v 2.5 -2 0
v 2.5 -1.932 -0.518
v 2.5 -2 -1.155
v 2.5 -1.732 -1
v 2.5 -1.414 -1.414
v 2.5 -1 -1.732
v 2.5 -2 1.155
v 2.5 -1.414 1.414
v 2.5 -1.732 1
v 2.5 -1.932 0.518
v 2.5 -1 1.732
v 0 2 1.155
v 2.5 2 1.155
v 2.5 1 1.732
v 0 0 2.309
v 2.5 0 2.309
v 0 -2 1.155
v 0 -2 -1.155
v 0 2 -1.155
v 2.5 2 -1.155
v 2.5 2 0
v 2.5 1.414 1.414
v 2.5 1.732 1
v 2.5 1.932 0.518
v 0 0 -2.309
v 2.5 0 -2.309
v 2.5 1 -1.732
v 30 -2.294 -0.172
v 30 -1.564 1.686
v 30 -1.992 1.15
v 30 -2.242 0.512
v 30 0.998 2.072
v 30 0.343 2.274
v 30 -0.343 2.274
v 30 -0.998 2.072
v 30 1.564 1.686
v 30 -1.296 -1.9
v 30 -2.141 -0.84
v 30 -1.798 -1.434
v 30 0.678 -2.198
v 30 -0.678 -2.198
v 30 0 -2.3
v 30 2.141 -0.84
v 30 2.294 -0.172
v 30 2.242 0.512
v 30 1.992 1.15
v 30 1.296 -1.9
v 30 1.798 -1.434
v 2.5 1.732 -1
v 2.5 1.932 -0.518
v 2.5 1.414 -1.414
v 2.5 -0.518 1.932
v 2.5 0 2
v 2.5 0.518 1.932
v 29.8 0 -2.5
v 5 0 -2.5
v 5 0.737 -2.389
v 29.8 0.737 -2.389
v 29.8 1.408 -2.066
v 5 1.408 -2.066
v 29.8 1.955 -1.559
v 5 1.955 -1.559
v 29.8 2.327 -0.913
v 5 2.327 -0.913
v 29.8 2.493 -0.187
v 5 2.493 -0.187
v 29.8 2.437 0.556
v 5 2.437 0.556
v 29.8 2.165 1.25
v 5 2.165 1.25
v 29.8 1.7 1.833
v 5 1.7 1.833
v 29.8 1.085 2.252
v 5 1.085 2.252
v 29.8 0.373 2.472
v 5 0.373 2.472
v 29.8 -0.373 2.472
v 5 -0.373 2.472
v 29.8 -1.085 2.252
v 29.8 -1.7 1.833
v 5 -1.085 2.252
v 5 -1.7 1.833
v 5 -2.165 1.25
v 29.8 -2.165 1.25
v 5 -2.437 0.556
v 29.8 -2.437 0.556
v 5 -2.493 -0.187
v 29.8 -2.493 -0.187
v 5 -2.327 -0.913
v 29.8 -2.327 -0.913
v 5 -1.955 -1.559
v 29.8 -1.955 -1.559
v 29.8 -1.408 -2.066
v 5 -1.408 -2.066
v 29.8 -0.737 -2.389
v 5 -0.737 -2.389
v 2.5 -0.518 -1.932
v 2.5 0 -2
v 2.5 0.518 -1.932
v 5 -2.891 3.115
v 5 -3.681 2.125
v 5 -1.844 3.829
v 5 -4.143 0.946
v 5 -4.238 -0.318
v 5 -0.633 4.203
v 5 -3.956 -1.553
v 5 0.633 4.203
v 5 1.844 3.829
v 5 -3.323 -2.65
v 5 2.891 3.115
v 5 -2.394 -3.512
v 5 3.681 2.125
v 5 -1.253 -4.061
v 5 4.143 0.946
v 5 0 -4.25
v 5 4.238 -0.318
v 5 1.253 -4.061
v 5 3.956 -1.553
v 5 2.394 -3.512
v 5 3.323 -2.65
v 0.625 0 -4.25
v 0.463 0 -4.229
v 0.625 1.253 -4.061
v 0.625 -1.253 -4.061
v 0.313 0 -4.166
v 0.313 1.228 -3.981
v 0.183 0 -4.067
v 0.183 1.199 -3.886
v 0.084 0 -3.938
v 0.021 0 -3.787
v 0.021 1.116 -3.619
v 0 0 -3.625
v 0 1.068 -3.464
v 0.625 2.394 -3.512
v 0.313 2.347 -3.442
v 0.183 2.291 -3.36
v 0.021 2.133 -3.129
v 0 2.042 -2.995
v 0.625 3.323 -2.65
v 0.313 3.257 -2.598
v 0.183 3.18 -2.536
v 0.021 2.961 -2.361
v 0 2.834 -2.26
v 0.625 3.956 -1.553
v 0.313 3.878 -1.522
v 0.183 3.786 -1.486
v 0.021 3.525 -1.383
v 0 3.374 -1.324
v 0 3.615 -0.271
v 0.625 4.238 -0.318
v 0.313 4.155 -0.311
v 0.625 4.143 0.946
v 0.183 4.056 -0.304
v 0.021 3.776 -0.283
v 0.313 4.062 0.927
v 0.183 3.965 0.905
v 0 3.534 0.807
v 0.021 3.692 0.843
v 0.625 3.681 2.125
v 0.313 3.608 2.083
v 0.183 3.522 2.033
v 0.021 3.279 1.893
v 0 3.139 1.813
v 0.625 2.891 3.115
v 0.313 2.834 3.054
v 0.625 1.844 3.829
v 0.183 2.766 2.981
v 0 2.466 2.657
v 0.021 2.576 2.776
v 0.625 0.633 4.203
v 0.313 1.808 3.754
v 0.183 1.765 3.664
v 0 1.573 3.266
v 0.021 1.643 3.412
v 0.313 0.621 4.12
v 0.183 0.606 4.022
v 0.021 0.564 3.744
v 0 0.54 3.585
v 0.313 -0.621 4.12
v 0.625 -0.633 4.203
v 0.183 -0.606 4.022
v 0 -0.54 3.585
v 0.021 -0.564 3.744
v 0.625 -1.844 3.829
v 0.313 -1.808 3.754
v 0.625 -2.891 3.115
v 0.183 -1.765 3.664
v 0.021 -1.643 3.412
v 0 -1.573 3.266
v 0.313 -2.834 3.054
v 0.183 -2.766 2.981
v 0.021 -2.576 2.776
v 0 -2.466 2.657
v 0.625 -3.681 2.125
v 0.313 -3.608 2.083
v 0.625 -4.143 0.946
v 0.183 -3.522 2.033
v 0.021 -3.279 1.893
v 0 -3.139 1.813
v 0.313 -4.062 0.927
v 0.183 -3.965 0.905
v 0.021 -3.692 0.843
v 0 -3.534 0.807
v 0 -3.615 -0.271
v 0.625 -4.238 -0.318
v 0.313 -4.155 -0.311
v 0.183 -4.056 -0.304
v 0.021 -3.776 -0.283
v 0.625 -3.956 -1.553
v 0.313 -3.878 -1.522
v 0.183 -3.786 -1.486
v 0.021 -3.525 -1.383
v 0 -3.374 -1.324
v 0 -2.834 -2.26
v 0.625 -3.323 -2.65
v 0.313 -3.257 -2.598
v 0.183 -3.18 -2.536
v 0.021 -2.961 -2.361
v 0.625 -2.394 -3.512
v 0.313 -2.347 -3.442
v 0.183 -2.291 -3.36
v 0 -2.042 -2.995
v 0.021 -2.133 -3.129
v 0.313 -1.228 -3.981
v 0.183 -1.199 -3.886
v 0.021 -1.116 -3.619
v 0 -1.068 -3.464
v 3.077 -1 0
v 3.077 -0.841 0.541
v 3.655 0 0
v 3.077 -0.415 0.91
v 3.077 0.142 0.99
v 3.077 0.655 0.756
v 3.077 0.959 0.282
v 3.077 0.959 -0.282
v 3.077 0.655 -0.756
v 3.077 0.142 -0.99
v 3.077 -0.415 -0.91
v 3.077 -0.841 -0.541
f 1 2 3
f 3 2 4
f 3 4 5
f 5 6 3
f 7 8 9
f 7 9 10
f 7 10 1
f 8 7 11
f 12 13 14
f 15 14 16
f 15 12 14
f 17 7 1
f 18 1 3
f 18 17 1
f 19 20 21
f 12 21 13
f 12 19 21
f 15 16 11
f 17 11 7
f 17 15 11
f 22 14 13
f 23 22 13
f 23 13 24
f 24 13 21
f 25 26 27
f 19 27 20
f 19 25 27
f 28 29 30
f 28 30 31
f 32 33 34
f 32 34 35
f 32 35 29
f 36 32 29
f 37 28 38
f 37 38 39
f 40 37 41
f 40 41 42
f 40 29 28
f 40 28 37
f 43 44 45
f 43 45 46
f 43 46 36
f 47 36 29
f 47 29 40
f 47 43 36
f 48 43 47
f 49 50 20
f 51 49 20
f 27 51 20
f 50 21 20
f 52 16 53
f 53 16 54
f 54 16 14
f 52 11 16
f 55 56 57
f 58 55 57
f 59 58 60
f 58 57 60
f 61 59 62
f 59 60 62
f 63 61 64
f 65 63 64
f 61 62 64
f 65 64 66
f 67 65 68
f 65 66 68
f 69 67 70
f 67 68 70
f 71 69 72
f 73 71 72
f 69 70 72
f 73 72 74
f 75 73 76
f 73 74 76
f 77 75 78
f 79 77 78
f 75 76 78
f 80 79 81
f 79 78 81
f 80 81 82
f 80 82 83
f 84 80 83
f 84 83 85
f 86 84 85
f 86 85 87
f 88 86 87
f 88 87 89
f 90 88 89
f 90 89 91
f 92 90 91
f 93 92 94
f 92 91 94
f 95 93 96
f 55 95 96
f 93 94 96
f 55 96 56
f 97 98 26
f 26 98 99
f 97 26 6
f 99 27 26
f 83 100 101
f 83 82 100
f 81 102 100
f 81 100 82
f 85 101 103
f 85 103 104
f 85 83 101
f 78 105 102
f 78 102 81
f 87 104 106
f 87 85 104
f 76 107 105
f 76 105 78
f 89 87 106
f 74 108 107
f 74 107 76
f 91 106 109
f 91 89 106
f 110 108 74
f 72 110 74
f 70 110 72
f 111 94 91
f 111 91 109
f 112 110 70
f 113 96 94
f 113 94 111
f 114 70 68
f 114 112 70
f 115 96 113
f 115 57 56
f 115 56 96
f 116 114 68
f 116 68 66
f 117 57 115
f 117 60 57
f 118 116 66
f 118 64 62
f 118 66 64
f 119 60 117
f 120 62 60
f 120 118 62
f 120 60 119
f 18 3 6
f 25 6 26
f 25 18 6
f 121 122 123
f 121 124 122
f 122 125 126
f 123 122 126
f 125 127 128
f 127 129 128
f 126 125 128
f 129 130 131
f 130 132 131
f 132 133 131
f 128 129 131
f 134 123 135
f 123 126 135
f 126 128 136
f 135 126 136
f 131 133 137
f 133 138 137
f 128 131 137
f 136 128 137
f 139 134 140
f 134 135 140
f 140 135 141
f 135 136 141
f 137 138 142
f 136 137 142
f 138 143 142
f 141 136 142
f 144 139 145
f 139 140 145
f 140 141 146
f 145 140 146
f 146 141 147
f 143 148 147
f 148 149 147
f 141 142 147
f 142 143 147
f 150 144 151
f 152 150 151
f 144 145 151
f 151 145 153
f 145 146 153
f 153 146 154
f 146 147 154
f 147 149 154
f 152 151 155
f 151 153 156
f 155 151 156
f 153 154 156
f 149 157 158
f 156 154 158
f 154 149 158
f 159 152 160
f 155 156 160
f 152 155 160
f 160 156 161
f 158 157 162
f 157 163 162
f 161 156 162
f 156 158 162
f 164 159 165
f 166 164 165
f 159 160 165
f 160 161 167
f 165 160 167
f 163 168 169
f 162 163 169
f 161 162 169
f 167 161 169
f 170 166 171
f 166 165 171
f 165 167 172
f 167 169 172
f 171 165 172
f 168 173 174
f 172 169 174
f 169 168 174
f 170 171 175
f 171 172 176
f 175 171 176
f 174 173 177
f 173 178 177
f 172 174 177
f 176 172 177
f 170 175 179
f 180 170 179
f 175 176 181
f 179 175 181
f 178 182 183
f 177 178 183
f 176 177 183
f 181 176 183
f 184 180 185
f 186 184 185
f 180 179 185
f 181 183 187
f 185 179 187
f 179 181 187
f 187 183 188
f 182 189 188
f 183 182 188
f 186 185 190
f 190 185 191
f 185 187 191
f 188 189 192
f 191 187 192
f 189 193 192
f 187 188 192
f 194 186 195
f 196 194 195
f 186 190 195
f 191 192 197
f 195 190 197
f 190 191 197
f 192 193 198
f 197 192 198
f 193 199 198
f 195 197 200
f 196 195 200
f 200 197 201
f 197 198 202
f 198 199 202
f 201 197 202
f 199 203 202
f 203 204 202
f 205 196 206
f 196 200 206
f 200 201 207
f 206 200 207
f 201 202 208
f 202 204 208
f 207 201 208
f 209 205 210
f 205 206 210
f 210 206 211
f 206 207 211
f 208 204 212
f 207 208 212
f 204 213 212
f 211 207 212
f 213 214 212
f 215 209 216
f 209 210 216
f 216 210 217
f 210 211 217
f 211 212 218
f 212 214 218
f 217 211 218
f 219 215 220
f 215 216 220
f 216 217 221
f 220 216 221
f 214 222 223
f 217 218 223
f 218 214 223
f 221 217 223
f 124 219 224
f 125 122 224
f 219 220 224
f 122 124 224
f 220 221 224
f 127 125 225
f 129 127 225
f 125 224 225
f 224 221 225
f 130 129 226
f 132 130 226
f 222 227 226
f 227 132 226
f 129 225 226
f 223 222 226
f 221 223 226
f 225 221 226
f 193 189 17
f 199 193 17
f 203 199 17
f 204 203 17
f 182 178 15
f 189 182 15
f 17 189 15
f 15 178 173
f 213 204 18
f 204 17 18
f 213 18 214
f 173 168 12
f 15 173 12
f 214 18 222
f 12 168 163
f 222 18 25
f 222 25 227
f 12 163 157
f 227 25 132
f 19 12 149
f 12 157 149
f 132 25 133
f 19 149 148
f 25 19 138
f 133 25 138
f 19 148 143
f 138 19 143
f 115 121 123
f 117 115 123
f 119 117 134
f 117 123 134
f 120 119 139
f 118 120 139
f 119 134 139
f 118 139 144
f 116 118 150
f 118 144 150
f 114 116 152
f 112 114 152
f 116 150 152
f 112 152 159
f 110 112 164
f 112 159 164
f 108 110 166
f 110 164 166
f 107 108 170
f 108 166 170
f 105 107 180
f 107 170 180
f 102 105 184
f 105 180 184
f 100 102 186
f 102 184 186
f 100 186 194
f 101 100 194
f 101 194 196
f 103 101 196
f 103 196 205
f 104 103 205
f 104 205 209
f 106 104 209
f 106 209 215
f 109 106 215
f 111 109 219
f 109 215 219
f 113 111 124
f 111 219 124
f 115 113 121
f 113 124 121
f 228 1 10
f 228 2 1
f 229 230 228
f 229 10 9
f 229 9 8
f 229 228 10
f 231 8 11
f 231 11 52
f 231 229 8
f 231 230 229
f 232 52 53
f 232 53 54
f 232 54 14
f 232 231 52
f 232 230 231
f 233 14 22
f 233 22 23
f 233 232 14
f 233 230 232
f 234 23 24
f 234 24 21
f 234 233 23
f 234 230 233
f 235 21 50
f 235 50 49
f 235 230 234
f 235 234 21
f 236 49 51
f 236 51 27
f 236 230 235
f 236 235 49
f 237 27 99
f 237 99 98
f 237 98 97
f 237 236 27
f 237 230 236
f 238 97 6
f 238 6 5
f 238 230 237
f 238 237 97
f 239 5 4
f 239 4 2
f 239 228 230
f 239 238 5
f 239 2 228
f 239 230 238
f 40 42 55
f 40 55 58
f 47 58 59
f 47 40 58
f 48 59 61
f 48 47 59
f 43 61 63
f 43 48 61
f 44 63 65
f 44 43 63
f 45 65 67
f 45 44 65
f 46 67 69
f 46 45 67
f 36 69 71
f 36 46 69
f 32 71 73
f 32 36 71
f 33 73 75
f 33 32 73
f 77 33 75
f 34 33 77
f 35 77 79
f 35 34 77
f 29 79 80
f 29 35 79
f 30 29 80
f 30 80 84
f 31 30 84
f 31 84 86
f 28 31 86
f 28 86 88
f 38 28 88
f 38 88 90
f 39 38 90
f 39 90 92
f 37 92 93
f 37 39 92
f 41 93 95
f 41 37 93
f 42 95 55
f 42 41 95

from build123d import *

# Parameters (mm, degrees)
SKETCH1_R           = 4.25
BASEHEAD_DEPTH      = 5
SKETCH2_R           = 2.5
BASEBODY_DEPTH      = 25
HEXAGONSOCKET_DEPTH = 2.5
TOPFILLET_R         = 0.625
CHAMFER1_SIZE       = 0.2


with BuildPart() as part:
    # Sketch1 → BaseHead (new body)
    with BuildSketch(Plane(origin=(0, 0, 0), x_dir=(0, 0, -1), z_dir=(1, 0, 0))):
        Circle(SKETCH1_R)
    extrude(amount=BASEHEAD_DEPTH)

    # Sketch2 → BaseBody (add)
    with BuildSketch(Plane(origin=(5, 0, 0), x_dir=(0, 0, -1), z_dir=(1, 0, 0))):
        Circle(SKETCH2_R)
    extrude(amount=BASEBODY_DEPTH)

    # Sketch3 → HexagonSocket (cut)
    with BuildSketch(Plane(origin=(0, 0, 0), x_dir=(0, 0, -1), z_dir=(1, 0, 0))):
        Polygon((2.309401077, 0), (1.154700538, 2), (-1.154700538, 2), (-2.309401077, 0), (-1.154700538, -2), (1.154700538, -2), align=None)
    extrude(amount=HEXAGONSOCKET_DEPTH, mode=Mode.SUBTRACT)

    # Sketch4 → Cut-Revolve1 (revolve, cut)
    with BuildSketch(Plane(origin=(-4.19613823, 0.75, 0), x_dir=(-1, 0, 0), z_dir=(0, 0, 1))):
        Polygon((-6.69613823, 2.75), (-7.850838768, 0.75), (-6.69613823, 0.75), align=None)
    revolve(axis=Axis((0.838992387, 0, 0), (-1, 0, 0)), mode=Mode.SUBTRACT)

    # TopFillet
    topfillet_edges = [part.edges().sort_by_distance(p)[0] for p in [
        (0, 0, 4.25),
    ]]
    fillet(topfillet_edges, radius=TOPFILLET_R)

    # Chamfer1
    chamfer1_edges = [part.edges().sort_by_distance(p)[0] for p in [
        (30, 0, 2.5),
    ]]
    chamfer(chamfer1_edges, length=CHAMFER1_SIZE)


solid = part.part
